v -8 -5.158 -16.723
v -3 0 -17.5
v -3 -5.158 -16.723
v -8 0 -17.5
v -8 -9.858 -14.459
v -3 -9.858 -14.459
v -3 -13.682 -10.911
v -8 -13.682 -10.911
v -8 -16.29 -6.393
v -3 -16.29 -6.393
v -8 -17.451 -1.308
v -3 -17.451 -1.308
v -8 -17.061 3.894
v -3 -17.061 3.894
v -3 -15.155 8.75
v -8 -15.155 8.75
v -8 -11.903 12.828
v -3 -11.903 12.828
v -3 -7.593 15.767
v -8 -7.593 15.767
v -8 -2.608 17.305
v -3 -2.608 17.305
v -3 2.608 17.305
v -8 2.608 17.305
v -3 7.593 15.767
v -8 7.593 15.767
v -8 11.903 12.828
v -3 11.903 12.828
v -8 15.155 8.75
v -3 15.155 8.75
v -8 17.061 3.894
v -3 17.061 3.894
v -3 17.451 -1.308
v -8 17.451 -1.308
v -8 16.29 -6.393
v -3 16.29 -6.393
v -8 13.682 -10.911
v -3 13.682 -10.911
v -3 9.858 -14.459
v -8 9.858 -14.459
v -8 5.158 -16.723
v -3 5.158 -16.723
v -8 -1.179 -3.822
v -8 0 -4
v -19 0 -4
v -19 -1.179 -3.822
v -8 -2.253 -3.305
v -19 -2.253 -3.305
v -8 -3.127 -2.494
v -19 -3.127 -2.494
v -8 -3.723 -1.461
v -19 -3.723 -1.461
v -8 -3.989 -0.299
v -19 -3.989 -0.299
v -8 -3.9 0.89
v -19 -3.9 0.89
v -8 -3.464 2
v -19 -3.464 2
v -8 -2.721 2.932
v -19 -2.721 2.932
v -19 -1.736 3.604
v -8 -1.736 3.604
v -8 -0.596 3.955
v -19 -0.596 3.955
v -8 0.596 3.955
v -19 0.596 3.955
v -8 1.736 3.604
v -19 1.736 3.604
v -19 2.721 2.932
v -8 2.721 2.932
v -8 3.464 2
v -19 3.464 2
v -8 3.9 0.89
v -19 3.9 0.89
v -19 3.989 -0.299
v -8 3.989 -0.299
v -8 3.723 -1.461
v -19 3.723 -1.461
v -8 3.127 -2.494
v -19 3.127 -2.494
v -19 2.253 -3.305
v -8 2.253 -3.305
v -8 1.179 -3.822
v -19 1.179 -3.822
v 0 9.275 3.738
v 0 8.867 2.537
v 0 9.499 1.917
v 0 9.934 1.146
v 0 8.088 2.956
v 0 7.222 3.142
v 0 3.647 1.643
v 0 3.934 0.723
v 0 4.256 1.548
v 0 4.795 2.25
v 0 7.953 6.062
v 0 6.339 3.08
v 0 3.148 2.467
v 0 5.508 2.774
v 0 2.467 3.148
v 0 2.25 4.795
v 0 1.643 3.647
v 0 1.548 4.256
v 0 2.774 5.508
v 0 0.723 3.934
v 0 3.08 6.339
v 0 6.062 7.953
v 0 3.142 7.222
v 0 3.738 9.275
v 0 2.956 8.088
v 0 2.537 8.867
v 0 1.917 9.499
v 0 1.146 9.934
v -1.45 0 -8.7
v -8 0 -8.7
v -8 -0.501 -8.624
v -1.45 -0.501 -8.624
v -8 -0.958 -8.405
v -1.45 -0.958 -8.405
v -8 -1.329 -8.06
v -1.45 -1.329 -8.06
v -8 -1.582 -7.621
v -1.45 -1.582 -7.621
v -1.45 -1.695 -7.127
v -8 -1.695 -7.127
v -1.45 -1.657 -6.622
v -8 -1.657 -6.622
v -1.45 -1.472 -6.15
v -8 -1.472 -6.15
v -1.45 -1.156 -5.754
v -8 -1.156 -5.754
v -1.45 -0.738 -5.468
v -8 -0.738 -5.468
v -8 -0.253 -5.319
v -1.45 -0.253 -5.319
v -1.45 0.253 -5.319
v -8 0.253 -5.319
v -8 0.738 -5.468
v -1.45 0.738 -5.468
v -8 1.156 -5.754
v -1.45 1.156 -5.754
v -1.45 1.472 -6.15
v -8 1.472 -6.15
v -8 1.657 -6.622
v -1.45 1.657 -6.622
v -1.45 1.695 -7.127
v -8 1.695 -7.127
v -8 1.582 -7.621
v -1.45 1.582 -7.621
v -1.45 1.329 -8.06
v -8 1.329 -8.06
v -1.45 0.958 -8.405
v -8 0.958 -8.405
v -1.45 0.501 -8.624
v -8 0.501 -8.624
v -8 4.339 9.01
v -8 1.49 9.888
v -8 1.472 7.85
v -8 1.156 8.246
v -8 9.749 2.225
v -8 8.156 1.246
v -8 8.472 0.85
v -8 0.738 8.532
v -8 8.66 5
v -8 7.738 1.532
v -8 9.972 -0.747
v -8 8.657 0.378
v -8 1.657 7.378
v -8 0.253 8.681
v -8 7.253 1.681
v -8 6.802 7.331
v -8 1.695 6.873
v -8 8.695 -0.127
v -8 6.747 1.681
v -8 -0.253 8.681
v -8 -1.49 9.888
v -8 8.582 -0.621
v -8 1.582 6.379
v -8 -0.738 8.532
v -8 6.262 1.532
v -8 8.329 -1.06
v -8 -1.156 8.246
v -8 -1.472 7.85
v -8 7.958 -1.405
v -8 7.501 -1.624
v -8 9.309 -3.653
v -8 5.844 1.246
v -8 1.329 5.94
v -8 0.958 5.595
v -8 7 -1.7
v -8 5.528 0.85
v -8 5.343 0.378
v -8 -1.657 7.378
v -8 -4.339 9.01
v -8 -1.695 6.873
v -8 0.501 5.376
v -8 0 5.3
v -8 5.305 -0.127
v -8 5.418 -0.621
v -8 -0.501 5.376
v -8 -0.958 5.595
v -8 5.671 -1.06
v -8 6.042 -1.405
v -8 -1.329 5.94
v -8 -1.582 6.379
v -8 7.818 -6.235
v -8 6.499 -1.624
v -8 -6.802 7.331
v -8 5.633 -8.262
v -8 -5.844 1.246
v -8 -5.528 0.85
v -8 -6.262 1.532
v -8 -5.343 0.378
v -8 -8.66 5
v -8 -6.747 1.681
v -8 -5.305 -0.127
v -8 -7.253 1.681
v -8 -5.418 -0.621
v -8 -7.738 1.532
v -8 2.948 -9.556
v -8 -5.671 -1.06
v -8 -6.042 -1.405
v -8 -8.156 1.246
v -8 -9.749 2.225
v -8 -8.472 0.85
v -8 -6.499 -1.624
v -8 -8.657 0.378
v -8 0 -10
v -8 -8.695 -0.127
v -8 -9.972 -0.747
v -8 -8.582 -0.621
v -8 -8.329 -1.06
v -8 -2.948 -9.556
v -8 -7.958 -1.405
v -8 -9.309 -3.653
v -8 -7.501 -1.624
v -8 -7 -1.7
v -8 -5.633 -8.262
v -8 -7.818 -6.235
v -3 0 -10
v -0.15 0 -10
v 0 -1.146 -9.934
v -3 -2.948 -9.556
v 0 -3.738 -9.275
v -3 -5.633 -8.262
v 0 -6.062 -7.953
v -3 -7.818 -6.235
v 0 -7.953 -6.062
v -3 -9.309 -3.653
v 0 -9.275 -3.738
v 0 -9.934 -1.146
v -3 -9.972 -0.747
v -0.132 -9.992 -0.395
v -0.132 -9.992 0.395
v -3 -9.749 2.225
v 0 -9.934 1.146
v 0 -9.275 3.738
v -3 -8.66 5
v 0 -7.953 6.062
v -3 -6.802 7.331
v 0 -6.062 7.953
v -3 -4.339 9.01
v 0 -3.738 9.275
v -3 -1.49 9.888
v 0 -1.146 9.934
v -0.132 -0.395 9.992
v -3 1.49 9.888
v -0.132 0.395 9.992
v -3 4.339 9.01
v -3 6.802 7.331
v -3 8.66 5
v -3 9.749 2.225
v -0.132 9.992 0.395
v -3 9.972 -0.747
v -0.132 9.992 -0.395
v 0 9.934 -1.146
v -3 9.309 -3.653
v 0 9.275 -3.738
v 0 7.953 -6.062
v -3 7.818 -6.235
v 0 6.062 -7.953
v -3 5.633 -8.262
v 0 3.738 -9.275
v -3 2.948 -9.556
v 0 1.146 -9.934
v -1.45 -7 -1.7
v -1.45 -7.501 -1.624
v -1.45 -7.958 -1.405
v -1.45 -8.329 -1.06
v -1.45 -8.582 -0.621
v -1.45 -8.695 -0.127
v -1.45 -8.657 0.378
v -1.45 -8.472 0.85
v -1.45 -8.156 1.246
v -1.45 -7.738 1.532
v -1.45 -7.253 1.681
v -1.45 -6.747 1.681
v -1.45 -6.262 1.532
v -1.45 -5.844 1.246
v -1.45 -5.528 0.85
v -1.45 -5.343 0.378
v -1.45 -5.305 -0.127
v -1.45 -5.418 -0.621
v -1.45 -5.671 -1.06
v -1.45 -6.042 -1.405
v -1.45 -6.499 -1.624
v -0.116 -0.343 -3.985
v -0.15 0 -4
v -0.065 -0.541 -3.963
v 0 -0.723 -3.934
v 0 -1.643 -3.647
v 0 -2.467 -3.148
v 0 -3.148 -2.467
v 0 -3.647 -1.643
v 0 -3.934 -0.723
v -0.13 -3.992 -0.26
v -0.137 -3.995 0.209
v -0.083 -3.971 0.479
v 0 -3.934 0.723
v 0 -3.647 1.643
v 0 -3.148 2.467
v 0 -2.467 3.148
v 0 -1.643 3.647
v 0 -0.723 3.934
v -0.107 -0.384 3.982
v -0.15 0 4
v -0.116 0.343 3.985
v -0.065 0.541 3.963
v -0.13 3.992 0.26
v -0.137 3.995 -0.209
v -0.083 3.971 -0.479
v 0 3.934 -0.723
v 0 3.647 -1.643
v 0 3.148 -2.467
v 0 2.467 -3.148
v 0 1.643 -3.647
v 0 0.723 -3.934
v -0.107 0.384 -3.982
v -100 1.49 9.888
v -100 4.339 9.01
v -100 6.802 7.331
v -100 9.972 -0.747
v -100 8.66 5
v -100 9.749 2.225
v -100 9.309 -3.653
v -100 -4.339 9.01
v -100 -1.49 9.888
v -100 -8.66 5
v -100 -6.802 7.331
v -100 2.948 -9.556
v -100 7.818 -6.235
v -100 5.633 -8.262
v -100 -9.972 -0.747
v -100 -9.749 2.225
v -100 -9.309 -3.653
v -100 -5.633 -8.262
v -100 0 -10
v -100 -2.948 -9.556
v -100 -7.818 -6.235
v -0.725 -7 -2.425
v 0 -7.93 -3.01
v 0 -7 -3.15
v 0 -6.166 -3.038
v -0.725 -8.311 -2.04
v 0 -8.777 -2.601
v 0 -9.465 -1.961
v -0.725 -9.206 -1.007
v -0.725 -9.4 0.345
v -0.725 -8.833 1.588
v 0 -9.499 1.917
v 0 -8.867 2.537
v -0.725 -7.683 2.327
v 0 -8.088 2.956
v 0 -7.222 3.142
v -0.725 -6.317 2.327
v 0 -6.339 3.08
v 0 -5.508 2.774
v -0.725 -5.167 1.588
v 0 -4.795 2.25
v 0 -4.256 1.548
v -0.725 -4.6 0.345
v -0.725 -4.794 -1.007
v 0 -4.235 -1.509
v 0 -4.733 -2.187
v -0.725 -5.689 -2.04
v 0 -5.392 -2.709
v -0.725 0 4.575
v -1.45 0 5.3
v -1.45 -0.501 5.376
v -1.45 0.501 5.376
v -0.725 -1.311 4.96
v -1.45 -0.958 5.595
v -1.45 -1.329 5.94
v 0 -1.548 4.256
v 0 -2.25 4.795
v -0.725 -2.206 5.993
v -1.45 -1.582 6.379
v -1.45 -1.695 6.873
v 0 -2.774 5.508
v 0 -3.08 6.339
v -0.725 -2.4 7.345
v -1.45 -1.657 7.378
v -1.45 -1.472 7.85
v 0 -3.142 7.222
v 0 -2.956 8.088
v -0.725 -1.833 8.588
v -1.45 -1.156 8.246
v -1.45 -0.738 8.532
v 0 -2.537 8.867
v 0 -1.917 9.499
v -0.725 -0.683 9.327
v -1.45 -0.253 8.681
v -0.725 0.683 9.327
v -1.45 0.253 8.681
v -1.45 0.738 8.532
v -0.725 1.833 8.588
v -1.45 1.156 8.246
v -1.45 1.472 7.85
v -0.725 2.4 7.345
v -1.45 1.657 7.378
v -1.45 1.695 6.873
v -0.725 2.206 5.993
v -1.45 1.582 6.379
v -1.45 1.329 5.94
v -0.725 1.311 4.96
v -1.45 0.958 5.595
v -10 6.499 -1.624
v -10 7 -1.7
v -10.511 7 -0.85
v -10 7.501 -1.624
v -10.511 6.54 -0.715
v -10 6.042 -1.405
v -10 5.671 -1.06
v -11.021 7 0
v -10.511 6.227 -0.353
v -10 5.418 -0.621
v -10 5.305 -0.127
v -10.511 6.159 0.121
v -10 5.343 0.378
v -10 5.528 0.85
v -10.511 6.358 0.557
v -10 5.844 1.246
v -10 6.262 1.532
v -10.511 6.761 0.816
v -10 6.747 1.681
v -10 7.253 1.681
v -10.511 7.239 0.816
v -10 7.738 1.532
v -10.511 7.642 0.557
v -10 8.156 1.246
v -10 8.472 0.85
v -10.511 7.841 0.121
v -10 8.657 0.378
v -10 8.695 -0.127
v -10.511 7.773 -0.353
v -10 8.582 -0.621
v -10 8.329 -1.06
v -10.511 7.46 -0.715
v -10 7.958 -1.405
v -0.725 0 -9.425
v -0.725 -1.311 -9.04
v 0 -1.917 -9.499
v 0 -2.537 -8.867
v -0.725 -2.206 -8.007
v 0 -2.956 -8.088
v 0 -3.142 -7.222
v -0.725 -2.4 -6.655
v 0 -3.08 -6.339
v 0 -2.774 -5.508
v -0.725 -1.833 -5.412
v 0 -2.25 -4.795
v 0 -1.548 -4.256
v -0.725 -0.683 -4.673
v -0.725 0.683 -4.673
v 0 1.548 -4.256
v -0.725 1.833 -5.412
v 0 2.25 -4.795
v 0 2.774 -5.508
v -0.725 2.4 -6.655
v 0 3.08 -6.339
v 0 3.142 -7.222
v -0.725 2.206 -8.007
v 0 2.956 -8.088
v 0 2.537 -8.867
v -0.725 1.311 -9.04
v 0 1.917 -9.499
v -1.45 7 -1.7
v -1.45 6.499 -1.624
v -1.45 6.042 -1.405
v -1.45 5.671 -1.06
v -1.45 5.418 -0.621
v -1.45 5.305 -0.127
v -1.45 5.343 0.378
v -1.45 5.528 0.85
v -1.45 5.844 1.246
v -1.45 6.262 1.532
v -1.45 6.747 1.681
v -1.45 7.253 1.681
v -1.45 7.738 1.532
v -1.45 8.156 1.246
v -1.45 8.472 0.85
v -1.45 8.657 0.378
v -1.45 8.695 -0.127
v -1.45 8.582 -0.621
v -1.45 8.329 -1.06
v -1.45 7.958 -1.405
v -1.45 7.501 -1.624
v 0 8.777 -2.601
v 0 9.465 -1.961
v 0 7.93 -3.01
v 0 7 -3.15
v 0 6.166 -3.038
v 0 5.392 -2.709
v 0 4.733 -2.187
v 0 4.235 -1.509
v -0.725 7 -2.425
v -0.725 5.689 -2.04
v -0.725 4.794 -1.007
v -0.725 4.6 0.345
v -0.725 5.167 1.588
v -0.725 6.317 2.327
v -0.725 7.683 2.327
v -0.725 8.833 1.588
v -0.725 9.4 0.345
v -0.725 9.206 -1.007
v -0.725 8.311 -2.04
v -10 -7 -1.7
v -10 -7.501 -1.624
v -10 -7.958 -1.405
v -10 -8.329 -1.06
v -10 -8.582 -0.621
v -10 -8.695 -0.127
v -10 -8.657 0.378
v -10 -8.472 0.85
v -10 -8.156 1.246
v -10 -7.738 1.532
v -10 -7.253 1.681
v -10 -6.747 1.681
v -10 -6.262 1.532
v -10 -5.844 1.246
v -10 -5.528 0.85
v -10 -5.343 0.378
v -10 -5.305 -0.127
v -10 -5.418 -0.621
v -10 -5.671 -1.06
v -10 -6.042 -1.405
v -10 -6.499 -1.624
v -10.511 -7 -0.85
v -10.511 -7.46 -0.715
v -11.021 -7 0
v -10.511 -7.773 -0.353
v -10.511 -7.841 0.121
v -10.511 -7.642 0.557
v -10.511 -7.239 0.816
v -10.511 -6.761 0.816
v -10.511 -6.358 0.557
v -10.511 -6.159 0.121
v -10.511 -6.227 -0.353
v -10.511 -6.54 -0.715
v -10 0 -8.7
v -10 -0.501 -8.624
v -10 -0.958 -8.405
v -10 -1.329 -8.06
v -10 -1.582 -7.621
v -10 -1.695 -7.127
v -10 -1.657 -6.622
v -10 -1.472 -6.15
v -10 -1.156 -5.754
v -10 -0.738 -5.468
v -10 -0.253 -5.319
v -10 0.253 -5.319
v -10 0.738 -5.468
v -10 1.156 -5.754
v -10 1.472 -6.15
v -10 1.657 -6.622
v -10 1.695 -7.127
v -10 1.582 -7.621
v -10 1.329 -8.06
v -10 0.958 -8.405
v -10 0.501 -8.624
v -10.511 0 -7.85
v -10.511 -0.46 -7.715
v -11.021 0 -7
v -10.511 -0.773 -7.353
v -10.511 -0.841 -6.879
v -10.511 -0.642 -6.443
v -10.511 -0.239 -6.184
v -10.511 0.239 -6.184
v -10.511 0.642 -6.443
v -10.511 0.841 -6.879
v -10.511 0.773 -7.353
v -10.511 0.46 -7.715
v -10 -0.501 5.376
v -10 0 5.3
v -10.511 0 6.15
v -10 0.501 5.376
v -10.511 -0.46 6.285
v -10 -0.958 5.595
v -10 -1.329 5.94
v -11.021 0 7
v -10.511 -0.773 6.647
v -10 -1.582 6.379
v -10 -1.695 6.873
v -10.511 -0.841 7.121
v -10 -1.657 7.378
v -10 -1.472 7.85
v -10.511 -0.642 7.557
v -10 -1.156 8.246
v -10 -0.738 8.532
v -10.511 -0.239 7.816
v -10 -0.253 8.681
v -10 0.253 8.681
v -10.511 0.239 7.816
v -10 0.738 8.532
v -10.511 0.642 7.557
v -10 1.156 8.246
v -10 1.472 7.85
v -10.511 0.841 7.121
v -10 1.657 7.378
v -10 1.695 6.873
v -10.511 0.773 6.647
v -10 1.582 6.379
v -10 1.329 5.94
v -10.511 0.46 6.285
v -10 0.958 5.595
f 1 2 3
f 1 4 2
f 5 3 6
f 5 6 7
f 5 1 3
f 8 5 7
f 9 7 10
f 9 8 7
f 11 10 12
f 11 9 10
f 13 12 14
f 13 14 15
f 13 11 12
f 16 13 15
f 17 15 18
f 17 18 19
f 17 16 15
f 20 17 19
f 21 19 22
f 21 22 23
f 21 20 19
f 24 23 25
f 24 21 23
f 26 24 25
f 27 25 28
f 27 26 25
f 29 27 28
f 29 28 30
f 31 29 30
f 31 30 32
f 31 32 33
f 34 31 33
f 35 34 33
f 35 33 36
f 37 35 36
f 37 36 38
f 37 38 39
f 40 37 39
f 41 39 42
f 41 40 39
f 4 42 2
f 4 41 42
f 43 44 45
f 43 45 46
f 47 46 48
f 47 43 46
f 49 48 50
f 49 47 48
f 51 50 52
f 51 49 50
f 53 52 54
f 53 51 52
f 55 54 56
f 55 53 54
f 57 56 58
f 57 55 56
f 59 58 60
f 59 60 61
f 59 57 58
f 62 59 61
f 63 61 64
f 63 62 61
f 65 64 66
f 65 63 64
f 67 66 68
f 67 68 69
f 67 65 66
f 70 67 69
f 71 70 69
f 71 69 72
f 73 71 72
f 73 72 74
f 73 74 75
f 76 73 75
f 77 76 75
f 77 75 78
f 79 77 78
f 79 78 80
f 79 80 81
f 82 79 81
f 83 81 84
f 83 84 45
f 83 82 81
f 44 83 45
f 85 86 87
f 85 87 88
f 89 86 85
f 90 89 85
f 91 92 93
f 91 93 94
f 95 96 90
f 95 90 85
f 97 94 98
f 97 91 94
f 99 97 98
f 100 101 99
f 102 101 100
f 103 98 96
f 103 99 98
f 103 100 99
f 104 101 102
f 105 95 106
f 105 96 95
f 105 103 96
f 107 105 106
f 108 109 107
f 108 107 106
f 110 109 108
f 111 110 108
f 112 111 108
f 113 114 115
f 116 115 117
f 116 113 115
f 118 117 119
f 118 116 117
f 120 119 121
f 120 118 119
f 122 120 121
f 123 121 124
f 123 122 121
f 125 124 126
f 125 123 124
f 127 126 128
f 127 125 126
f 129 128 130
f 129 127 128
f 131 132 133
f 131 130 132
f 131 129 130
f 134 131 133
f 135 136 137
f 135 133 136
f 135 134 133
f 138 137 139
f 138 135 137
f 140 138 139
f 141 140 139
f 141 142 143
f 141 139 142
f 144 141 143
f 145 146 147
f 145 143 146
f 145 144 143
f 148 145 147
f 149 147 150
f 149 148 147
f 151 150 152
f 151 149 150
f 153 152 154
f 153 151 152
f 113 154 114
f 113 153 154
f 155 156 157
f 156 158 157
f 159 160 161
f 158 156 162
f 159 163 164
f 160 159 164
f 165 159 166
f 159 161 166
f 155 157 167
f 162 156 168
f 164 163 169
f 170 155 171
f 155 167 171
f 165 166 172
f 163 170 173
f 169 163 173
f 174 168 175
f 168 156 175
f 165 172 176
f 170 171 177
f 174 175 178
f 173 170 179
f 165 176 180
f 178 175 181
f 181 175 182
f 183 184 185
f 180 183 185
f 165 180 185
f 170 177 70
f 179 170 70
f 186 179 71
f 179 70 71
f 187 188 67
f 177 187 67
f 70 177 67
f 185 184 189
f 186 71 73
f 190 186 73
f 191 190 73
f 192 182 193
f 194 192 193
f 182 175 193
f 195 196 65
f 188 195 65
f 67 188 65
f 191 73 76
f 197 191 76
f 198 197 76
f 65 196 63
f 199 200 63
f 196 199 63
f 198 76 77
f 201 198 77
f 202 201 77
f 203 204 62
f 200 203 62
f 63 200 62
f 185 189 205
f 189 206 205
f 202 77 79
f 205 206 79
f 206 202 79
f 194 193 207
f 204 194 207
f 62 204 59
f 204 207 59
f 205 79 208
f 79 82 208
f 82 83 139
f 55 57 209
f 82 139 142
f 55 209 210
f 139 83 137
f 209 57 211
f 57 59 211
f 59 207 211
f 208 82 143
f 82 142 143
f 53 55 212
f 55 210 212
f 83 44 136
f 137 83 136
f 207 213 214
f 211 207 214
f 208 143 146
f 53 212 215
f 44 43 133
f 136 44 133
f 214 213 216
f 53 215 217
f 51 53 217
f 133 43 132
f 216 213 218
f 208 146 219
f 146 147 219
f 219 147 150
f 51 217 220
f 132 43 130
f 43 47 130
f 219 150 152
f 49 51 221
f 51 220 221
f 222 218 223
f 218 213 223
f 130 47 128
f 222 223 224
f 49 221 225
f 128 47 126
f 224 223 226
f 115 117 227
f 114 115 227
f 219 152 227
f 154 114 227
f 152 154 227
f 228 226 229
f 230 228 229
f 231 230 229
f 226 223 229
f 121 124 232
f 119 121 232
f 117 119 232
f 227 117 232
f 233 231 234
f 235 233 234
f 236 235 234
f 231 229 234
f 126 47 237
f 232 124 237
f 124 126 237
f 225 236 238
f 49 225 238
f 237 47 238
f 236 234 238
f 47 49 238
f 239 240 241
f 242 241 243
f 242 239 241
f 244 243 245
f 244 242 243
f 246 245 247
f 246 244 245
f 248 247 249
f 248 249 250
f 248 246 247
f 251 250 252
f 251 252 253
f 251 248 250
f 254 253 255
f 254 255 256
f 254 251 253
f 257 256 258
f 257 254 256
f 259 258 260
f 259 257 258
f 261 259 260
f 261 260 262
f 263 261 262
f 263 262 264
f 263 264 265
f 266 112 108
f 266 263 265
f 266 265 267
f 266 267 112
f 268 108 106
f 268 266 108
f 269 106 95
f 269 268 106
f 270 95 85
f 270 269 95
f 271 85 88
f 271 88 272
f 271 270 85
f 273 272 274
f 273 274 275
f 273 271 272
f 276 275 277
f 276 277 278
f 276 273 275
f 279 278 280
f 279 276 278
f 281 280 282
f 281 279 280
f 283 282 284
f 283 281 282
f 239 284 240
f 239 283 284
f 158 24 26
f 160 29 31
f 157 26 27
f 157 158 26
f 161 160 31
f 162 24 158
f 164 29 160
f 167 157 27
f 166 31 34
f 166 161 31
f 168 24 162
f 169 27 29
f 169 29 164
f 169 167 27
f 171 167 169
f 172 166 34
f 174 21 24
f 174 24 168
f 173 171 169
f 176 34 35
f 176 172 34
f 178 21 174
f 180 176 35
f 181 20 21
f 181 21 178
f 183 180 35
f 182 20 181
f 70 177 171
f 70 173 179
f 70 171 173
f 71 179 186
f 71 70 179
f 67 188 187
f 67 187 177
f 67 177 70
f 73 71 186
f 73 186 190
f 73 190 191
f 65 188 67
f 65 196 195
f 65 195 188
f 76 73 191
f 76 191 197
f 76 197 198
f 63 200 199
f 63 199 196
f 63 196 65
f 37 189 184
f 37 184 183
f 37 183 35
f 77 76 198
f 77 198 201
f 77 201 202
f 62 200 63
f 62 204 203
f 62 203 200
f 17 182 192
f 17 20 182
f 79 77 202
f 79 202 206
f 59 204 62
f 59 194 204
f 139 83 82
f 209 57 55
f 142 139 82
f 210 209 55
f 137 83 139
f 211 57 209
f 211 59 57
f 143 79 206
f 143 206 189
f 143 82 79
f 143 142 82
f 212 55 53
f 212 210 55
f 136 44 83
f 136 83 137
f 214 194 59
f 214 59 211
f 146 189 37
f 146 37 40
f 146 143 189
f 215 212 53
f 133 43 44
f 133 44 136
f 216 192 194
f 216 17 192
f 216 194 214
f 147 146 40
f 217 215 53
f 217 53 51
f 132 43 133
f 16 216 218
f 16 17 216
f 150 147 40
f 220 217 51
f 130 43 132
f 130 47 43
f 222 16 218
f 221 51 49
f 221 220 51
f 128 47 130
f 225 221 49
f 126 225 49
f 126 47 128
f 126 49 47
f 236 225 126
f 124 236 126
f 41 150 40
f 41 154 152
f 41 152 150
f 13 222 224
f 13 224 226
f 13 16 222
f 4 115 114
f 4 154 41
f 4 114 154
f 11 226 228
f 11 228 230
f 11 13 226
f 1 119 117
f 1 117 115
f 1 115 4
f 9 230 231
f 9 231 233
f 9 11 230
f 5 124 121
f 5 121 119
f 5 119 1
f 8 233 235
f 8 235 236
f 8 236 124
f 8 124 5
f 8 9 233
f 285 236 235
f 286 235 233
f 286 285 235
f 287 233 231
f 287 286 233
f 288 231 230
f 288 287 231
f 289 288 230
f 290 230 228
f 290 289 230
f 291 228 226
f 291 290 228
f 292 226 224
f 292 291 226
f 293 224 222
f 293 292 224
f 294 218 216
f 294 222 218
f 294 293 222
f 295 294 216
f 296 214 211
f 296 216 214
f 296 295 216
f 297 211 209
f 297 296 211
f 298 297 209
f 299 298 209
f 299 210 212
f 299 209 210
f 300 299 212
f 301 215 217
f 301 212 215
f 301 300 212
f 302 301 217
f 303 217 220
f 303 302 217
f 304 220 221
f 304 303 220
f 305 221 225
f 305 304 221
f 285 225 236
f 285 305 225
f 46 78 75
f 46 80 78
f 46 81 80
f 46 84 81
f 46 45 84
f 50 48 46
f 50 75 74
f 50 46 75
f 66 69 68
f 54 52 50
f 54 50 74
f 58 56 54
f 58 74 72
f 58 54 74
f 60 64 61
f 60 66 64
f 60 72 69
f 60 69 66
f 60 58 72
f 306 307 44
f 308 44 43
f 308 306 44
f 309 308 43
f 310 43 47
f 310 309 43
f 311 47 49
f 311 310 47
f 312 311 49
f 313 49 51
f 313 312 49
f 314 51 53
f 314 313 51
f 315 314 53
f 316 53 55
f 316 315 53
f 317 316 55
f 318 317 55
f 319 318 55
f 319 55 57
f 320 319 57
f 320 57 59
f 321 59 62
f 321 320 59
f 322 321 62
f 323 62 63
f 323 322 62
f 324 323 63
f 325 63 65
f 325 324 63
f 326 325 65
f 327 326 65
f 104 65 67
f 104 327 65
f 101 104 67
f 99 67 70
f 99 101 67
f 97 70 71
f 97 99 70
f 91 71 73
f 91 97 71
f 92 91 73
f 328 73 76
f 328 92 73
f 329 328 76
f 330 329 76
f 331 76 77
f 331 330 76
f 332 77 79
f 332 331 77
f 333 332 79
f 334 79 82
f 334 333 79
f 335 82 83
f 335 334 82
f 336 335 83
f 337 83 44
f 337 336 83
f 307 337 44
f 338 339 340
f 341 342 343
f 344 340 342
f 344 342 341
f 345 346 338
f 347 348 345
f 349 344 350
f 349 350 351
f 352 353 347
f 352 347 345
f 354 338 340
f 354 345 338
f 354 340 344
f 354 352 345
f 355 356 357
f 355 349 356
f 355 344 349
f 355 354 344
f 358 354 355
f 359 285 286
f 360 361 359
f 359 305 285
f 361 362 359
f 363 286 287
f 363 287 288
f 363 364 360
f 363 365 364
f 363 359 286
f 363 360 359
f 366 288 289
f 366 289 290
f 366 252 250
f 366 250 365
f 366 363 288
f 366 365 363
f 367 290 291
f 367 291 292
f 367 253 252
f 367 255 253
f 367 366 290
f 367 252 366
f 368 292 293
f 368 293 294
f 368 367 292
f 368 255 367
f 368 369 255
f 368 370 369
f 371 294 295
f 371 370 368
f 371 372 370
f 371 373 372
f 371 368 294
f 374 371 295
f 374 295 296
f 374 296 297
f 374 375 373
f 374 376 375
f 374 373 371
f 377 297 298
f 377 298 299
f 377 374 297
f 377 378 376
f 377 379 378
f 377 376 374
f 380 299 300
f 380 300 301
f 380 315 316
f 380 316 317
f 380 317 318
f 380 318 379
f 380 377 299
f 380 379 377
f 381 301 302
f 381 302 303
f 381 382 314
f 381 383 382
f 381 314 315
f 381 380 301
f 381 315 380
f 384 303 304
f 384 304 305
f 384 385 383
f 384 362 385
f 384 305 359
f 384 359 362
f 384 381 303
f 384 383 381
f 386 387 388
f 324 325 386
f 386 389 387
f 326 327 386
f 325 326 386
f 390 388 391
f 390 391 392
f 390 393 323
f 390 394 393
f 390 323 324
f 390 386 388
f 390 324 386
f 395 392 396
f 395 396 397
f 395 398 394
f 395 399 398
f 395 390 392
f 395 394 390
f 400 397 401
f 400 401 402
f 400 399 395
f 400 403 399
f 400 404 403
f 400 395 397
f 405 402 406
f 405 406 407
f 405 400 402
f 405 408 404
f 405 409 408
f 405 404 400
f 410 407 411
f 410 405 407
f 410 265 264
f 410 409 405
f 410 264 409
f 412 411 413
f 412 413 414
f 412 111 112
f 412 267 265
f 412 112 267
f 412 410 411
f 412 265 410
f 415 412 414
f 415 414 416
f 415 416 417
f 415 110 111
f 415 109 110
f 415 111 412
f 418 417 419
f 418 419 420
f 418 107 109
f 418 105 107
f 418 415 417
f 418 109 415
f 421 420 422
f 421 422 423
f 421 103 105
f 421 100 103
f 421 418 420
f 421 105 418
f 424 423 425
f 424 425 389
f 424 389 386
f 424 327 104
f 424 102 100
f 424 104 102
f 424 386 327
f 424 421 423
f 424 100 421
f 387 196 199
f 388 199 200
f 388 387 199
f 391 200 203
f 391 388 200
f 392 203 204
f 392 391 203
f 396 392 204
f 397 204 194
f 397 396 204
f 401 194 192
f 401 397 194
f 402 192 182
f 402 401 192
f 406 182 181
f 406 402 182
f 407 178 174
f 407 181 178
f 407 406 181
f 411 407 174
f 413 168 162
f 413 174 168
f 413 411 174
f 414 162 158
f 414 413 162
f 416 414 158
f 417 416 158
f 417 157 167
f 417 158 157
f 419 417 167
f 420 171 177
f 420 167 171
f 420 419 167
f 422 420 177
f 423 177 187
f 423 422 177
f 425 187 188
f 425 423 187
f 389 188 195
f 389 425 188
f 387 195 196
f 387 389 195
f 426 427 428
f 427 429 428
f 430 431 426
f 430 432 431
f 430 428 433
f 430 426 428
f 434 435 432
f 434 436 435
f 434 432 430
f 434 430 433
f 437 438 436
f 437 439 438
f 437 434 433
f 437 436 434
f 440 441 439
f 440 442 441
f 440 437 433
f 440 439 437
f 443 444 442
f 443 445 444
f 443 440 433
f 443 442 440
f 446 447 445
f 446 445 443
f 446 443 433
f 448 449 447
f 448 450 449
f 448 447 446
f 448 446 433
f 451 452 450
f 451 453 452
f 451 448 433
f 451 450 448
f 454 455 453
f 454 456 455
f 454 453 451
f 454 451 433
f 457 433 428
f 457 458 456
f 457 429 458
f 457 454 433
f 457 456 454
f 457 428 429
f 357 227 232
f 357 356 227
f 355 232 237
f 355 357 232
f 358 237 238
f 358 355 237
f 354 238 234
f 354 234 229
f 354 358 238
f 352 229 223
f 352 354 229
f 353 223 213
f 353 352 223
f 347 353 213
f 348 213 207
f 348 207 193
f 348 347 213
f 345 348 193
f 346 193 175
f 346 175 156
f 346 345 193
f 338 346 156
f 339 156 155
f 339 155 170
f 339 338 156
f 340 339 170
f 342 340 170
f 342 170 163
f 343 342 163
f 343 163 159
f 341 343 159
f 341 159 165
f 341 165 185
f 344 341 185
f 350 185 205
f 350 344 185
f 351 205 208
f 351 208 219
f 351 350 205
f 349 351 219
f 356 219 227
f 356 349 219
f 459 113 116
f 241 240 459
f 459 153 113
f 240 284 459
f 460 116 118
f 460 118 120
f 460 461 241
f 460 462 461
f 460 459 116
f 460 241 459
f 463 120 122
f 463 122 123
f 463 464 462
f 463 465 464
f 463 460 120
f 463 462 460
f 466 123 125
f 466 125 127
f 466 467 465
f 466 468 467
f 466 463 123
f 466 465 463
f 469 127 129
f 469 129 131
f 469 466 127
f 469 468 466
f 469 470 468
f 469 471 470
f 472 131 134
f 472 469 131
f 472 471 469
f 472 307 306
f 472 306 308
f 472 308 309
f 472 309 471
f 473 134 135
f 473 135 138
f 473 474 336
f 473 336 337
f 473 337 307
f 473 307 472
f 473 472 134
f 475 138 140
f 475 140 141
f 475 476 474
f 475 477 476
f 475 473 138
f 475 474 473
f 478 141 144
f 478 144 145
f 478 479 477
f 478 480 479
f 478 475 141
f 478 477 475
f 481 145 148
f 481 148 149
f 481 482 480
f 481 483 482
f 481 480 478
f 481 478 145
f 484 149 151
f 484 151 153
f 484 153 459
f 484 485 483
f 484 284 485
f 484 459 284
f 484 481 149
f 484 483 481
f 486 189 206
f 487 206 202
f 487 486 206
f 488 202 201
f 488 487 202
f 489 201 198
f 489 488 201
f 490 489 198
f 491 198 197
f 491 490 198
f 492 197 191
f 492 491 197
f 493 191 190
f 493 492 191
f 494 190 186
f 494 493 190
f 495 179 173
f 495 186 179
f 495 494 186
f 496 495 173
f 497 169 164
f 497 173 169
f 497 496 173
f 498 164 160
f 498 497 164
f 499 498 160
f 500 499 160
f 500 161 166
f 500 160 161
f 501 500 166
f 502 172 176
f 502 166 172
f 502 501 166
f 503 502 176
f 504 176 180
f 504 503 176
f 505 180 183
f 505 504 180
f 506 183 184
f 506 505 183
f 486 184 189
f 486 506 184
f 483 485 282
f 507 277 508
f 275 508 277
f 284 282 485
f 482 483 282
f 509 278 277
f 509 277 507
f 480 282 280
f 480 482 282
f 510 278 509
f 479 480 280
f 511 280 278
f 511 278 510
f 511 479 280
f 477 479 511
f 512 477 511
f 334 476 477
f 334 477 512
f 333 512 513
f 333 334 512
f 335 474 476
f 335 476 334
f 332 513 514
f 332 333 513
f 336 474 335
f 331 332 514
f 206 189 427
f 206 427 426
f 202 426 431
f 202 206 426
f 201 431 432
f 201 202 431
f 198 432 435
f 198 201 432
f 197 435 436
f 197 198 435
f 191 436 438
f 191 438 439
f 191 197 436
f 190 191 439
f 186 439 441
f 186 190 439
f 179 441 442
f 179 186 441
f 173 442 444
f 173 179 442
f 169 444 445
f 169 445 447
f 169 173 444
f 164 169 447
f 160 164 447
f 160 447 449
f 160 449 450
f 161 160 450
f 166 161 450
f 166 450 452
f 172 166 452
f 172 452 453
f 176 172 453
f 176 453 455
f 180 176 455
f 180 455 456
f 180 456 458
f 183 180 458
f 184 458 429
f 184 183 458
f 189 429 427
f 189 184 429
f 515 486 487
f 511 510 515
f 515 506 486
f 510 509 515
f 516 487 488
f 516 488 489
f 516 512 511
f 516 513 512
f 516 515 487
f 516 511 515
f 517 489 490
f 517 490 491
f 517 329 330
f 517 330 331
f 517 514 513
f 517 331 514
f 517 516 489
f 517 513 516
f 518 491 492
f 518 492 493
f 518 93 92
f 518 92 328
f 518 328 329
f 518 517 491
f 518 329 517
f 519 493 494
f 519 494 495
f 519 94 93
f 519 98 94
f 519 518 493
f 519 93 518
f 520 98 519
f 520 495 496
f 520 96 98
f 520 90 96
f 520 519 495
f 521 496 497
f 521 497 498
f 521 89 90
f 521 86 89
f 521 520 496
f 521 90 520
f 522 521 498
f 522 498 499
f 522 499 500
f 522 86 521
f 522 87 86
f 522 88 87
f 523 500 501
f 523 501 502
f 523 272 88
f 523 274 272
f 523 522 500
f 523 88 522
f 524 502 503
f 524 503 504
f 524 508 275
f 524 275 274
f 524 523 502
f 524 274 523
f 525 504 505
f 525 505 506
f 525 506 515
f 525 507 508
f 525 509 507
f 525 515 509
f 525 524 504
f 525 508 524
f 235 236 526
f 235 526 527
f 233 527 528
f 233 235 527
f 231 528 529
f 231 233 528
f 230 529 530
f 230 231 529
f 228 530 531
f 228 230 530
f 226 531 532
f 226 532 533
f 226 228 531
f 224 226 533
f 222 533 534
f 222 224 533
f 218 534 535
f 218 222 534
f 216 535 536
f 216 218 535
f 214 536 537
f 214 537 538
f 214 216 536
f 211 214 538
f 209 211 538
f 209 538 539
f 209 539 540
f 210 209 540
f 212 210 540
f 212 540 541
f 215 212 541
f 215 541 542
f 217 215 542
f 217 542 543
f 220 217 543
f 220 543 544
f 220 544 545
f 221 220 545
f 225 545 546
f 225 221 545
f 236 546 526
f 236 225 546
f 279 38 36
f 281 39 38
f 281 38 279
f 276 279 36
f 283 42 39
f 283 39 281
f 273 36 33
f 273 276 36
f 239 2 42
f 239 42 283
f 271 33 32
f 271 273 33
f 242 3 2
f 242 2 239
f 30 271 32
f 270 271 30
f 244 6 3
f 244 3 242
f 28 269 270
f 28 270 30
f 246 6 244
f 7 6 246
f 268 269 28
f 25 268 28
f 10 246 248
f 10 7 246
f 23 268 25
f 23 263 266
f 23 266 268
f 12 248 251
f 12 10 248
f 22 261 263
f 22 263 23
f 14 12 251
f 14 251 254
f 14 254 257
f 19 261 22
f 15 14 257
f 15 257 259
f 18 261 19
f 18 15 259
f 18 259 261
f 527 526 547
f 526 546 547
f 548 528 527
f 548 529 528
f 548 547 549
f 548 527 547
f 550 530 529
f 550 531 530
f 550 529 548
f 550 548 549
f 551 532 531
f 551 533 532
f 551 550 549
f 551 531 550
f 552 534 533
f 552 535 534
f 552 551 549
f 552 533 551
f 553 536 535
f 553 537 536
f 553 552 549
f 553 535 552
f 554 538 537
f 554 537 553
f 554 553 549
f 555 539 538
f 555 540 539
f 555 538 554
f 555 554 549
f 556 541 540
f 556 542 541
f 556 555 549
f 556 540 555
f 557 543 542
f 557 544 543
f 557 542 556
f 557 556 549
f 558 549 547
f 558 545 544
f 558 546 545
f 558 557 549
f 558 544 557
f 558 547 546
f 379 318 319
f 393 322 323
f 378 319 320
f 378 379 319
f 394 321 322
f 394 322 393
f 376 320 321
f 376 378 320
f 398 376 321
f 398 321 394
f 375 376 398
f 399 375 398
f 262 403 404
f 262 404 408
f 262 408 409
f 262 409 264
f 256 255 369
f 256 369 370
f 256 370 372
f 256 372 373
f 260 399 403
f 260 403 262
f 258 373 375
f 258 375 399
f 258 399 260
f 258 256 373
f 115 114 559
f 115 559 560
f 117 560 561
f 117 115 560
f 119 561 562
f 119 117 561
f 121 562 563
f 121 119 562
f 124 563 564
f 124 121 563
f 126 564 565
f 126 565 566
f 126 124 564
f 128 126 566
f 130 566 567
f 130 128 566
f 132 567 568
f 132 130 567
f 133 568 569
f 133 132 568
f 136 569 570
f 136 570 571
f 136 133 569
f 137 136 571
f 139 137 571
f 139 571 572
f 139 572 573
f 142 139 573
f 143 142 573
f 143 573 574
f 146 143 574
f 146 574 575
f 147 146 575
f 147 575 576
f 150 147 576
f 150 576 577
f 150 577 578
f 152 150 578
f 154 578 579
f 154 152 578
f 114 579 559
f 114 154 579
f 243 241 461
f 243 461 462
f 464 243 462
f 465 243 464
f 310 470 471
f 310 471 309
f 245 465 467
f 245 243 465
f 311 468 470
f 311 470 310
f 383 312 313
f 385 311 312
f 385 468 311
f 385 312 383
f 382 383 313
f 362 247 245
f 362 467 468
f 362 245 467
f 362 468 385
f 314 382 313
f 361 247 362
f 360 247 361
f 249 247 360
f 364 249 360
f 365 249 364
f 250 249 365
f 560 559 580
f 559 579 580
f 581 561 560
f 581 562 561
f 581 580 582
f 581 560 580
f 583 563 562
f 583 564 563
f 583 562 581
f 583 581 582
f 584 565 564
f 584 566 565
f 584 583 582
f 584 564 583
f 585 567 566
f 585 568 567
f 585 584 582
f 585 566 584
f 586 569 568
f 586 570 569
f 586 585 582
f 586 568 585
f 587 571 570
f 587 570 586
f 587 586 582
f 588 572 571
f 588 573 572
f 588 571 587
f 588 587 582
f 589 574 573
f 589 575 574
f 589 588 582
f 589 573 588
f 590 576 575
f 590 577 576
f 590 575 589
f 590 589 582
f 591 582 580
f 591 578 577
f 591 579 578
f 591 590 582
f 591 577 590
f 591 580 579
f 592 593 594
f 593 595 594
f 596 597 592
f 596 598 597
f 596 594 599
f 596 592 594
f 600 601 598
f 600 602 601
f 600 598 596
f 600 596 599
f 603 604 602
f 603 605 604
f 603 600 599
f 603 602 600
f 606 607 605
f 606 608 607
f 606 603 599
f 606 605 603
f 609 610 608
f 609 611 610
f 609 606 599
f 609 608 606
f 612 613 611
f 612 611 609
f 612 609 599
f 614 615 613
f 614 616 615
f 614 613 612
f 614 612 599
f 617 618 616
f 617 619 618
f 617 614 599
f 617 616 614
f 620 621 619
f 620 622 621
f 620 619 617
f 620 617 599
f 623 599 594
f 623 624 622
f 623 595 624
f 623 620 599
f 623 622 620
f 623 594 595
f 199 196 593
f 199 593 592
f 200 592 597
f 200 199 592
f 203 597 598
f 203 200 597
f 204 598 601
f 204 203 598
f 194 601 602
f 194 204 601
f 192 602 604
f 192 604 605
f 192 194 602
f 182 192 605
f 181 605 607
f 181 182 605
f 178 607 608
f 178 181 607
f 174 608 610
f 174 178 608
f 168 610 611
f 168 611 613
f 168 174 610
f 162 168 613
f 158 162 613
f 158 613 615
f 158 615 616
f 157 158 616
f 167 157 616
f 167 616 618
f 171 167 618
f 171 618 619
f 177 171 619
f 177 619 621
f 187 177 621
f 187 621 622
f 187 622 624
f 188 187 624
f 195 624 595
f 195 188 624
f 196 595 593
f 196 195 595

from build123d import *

# Parameters (mm, degrees)
CSK_FOR_M3_COUNTERSUNK_RAISED_HEAD_S_2_COUNT = 2
CSK_FOR_M3_COUNTERSUNK_RAISED_HEAD_S_2_PITCH = 9.899494937
CSK_FOR_M3_COUNTERSUNK_RAISED_HEAD_S_3_COUNT = 2
CSK_FOR_M3_COUNTERSUNK_RAISED_HEAD_S_3_PITCH = 14
CSK_FOR_M3_COUNTERSUNK_RAISED_HEAD_S_4_COUNT = 2
CSK_FOR_M3_COUNTERSUNK_RAISED_HEAD_S_4_PITCH = 9.899494937


with BuildPart() as part:
    # Sketch1 → Revolve2 (revolve)
    with BuildSketch(Plane(origin=(0, 0, 0), x_dir=(1, 0, 0), z_dir=(0, 1, 0))):
        Polygon((-3, 10), (-3, 17.5), (-8, 17.5), (-8, 10), (-100, 10), (-100, 0), (-19, 0), (-19, 4), (0, 4), (0, 10), align=None)
    revolve(axis=Axis((0, 0, 0), (-1, 0, 0)))


with BuildPart() as body_2:
    # Split1: the piece on the far side of the plane
    add(part.part)
    split(bisect_by=Plane(origin=(-8, 0, 0), x_dir=(0, 0, -1), z_dir=(-1, 0, 0)), keep=Keep.BOTTOM)


with BuildPart() as part_1:
    add(part.part)

    # Split1
    split(bisect_by=Plane(origin=(-8, 0, 0), x_dir=(0, 0, -1), z_dir=(-1, 0, 0)), keep=Keep.TOP)


with BuildPart() as csk_for_m3_countersunk_raised_head_screw_tool:
    # Sketch7 → CSK for M3 Countersunk Raised Head Screw2 (revolve)
    with BuildSketch(Plane(origin=(0, 0, 7), x_dir=(0, 0, -1), z_dir=(0, 1, 0))):
        Polygon((0, 0), (0, 11.021463052), (1.7, 10), (1.7, 1.45), (3.15, 0), align=None)
    csk_for_m3_countersunk_raised_head_screw = revolve(axis=Axis((6.35, 0, 7), (-1, 0, 0)))


with BuildPart() as part_2:
    add(part_1.part)

    # CSK for M3 Countersunk Raised Head Screw2: cut by csk_for_m3_countersunk_raised_head_screw_tool
    add(csk_for_m3_countersunk_raised_head_screw_tool.part, mode=Mode.SUBTRACT)


with BuildPart() as body_2_1:
    add(body_2.part)

    # CSK for M3 Countersunk Raised Head Screw2: cut by csk_for_m3_countersunk_raised_head_screw_tool
    add(csk_for_m3_countersunk_raised_head_screw_tool.part, mode=Mode.SUBTRACT)


with BuildPart() as csk_for_m3_countersunk_raised_head_s_2_tool:
    # CSK for M3 Countersunk Raised Head S 2: CSK for M3 Countersunk Raised Head Screw2 ×2
    with Locations(*[Vector(0, 0.7071067811865476, -0.7071067811865476) * (i * CSK_FOR_M3_COUNTERSUNK_RAISED_HEAD_S_2_PITCH) for i in range(1, CSK_FOR_M3_COUNTERSUNK_RAISED_HEAD_S_2_COUNT)]):
        add(csk_for_m3_countersunk_raised_head_screw)


with BuildPart() as part_3:
    add(part_2.part)

    # CSK for M3 Countersunk Raised Head S 2: cut by csk_for_m3_countersunk_raised_head_s_2_tool
    add(csk_for_m3_countersunk_raised_head_s_2_tool.part, mode=Mode.SUBTRACT)


with BuildPart() as body_2_2:
    add(body_2_1.part)

    # CSK for M3 Countersunk Raised Head S 2: cut by csk_for_m3_countersunk_raised_head_s_2_tool
    add(csk_for_m3_countersunk_raised_head_s_2_tool.part, mode=Mode.SUBTRACT)


with BuildPart() as csk_for_m3_countersunk_raised_head_s_3_tool:
    # CSK for M3 Countersunk Raised Head S 3: CSK for M3 Countersunk Raised Head Screw2 ×2
    with Locations(*[(0, 0, -i * CSK_FOR_M3_COUNTERSUNK_RAISED_HEAD_S_3_PITCH) for i in range(1, CSK_FOR_M3_COUNTERSUNK_RAISED_HEAD_S_3_COUNT)]):
        add(csk_for_m3_countersunk_raised_head_screw)


with BuildPart() as part_4:
    add(part_3.part)

    # CSK for M3 Countersunk Raised Head S 3: cut by csk_for_m3_countersunk_raised_head_s_3_tool
    add(csk_for_m3_countersunk_raised_head_s_3_tool.part, mode=Mode.SUBTRACT)


with BuildPart() as body_2_3:
    add(body_2_2.part)

    # CSK for M3 Countersunk Raised Head S 3: cut by csk_for_m3_countersunk_raised_head_s_3_tool
    add(csk_for_m3_countersunk_raised_head_s_3_tool.part, mode=Mode.SUBTRACT)


with BuildPart() as csk_for_m3_countersunk_raised_head_s_4_tool:
    # CSK for M3 Countersunk Raised Head S 4: CSK for M3 Countersunk Raised Head Screw2 ×2
    with Locations(*[Vector(0, -0.7071067811865476, -0.7071067811865476) * (i * CSK_FOR_M3_COUNTERSUNK_RAISED_HEAD_S_4_PITCH) for i in range(1, CSK_FOR_M3_COUNTERSUNK_RAISED_HEAD_S_4_COUNT)]):
        add(csk_for_m3_countersunk_raised_head_screw)


with BuildPart() as part_5:
    add(part_4.part)

    # CSK for M3 Countersunk Raised Head S 4: cut by csk_for_m3_countersunk_raised_head_s_4_tool
    add(csk_for_m3_countersunk_raised_head_s_4_tool.part, mode=Mode.SUBTRACT)


with BuildPart() as body_2_4:
    add(body_2_3.part)

    # CSK for M3 Countersunk Raised Head S 4: cut by csk_for_m3_countersunk_raised_head_s_4_tool
    add(csk_for_m3_countersunk_raised_head_s_4_tool.part, mode=Mode.SUBTRACT)


solid = Compound([part_5.part, body_2_4.part])
